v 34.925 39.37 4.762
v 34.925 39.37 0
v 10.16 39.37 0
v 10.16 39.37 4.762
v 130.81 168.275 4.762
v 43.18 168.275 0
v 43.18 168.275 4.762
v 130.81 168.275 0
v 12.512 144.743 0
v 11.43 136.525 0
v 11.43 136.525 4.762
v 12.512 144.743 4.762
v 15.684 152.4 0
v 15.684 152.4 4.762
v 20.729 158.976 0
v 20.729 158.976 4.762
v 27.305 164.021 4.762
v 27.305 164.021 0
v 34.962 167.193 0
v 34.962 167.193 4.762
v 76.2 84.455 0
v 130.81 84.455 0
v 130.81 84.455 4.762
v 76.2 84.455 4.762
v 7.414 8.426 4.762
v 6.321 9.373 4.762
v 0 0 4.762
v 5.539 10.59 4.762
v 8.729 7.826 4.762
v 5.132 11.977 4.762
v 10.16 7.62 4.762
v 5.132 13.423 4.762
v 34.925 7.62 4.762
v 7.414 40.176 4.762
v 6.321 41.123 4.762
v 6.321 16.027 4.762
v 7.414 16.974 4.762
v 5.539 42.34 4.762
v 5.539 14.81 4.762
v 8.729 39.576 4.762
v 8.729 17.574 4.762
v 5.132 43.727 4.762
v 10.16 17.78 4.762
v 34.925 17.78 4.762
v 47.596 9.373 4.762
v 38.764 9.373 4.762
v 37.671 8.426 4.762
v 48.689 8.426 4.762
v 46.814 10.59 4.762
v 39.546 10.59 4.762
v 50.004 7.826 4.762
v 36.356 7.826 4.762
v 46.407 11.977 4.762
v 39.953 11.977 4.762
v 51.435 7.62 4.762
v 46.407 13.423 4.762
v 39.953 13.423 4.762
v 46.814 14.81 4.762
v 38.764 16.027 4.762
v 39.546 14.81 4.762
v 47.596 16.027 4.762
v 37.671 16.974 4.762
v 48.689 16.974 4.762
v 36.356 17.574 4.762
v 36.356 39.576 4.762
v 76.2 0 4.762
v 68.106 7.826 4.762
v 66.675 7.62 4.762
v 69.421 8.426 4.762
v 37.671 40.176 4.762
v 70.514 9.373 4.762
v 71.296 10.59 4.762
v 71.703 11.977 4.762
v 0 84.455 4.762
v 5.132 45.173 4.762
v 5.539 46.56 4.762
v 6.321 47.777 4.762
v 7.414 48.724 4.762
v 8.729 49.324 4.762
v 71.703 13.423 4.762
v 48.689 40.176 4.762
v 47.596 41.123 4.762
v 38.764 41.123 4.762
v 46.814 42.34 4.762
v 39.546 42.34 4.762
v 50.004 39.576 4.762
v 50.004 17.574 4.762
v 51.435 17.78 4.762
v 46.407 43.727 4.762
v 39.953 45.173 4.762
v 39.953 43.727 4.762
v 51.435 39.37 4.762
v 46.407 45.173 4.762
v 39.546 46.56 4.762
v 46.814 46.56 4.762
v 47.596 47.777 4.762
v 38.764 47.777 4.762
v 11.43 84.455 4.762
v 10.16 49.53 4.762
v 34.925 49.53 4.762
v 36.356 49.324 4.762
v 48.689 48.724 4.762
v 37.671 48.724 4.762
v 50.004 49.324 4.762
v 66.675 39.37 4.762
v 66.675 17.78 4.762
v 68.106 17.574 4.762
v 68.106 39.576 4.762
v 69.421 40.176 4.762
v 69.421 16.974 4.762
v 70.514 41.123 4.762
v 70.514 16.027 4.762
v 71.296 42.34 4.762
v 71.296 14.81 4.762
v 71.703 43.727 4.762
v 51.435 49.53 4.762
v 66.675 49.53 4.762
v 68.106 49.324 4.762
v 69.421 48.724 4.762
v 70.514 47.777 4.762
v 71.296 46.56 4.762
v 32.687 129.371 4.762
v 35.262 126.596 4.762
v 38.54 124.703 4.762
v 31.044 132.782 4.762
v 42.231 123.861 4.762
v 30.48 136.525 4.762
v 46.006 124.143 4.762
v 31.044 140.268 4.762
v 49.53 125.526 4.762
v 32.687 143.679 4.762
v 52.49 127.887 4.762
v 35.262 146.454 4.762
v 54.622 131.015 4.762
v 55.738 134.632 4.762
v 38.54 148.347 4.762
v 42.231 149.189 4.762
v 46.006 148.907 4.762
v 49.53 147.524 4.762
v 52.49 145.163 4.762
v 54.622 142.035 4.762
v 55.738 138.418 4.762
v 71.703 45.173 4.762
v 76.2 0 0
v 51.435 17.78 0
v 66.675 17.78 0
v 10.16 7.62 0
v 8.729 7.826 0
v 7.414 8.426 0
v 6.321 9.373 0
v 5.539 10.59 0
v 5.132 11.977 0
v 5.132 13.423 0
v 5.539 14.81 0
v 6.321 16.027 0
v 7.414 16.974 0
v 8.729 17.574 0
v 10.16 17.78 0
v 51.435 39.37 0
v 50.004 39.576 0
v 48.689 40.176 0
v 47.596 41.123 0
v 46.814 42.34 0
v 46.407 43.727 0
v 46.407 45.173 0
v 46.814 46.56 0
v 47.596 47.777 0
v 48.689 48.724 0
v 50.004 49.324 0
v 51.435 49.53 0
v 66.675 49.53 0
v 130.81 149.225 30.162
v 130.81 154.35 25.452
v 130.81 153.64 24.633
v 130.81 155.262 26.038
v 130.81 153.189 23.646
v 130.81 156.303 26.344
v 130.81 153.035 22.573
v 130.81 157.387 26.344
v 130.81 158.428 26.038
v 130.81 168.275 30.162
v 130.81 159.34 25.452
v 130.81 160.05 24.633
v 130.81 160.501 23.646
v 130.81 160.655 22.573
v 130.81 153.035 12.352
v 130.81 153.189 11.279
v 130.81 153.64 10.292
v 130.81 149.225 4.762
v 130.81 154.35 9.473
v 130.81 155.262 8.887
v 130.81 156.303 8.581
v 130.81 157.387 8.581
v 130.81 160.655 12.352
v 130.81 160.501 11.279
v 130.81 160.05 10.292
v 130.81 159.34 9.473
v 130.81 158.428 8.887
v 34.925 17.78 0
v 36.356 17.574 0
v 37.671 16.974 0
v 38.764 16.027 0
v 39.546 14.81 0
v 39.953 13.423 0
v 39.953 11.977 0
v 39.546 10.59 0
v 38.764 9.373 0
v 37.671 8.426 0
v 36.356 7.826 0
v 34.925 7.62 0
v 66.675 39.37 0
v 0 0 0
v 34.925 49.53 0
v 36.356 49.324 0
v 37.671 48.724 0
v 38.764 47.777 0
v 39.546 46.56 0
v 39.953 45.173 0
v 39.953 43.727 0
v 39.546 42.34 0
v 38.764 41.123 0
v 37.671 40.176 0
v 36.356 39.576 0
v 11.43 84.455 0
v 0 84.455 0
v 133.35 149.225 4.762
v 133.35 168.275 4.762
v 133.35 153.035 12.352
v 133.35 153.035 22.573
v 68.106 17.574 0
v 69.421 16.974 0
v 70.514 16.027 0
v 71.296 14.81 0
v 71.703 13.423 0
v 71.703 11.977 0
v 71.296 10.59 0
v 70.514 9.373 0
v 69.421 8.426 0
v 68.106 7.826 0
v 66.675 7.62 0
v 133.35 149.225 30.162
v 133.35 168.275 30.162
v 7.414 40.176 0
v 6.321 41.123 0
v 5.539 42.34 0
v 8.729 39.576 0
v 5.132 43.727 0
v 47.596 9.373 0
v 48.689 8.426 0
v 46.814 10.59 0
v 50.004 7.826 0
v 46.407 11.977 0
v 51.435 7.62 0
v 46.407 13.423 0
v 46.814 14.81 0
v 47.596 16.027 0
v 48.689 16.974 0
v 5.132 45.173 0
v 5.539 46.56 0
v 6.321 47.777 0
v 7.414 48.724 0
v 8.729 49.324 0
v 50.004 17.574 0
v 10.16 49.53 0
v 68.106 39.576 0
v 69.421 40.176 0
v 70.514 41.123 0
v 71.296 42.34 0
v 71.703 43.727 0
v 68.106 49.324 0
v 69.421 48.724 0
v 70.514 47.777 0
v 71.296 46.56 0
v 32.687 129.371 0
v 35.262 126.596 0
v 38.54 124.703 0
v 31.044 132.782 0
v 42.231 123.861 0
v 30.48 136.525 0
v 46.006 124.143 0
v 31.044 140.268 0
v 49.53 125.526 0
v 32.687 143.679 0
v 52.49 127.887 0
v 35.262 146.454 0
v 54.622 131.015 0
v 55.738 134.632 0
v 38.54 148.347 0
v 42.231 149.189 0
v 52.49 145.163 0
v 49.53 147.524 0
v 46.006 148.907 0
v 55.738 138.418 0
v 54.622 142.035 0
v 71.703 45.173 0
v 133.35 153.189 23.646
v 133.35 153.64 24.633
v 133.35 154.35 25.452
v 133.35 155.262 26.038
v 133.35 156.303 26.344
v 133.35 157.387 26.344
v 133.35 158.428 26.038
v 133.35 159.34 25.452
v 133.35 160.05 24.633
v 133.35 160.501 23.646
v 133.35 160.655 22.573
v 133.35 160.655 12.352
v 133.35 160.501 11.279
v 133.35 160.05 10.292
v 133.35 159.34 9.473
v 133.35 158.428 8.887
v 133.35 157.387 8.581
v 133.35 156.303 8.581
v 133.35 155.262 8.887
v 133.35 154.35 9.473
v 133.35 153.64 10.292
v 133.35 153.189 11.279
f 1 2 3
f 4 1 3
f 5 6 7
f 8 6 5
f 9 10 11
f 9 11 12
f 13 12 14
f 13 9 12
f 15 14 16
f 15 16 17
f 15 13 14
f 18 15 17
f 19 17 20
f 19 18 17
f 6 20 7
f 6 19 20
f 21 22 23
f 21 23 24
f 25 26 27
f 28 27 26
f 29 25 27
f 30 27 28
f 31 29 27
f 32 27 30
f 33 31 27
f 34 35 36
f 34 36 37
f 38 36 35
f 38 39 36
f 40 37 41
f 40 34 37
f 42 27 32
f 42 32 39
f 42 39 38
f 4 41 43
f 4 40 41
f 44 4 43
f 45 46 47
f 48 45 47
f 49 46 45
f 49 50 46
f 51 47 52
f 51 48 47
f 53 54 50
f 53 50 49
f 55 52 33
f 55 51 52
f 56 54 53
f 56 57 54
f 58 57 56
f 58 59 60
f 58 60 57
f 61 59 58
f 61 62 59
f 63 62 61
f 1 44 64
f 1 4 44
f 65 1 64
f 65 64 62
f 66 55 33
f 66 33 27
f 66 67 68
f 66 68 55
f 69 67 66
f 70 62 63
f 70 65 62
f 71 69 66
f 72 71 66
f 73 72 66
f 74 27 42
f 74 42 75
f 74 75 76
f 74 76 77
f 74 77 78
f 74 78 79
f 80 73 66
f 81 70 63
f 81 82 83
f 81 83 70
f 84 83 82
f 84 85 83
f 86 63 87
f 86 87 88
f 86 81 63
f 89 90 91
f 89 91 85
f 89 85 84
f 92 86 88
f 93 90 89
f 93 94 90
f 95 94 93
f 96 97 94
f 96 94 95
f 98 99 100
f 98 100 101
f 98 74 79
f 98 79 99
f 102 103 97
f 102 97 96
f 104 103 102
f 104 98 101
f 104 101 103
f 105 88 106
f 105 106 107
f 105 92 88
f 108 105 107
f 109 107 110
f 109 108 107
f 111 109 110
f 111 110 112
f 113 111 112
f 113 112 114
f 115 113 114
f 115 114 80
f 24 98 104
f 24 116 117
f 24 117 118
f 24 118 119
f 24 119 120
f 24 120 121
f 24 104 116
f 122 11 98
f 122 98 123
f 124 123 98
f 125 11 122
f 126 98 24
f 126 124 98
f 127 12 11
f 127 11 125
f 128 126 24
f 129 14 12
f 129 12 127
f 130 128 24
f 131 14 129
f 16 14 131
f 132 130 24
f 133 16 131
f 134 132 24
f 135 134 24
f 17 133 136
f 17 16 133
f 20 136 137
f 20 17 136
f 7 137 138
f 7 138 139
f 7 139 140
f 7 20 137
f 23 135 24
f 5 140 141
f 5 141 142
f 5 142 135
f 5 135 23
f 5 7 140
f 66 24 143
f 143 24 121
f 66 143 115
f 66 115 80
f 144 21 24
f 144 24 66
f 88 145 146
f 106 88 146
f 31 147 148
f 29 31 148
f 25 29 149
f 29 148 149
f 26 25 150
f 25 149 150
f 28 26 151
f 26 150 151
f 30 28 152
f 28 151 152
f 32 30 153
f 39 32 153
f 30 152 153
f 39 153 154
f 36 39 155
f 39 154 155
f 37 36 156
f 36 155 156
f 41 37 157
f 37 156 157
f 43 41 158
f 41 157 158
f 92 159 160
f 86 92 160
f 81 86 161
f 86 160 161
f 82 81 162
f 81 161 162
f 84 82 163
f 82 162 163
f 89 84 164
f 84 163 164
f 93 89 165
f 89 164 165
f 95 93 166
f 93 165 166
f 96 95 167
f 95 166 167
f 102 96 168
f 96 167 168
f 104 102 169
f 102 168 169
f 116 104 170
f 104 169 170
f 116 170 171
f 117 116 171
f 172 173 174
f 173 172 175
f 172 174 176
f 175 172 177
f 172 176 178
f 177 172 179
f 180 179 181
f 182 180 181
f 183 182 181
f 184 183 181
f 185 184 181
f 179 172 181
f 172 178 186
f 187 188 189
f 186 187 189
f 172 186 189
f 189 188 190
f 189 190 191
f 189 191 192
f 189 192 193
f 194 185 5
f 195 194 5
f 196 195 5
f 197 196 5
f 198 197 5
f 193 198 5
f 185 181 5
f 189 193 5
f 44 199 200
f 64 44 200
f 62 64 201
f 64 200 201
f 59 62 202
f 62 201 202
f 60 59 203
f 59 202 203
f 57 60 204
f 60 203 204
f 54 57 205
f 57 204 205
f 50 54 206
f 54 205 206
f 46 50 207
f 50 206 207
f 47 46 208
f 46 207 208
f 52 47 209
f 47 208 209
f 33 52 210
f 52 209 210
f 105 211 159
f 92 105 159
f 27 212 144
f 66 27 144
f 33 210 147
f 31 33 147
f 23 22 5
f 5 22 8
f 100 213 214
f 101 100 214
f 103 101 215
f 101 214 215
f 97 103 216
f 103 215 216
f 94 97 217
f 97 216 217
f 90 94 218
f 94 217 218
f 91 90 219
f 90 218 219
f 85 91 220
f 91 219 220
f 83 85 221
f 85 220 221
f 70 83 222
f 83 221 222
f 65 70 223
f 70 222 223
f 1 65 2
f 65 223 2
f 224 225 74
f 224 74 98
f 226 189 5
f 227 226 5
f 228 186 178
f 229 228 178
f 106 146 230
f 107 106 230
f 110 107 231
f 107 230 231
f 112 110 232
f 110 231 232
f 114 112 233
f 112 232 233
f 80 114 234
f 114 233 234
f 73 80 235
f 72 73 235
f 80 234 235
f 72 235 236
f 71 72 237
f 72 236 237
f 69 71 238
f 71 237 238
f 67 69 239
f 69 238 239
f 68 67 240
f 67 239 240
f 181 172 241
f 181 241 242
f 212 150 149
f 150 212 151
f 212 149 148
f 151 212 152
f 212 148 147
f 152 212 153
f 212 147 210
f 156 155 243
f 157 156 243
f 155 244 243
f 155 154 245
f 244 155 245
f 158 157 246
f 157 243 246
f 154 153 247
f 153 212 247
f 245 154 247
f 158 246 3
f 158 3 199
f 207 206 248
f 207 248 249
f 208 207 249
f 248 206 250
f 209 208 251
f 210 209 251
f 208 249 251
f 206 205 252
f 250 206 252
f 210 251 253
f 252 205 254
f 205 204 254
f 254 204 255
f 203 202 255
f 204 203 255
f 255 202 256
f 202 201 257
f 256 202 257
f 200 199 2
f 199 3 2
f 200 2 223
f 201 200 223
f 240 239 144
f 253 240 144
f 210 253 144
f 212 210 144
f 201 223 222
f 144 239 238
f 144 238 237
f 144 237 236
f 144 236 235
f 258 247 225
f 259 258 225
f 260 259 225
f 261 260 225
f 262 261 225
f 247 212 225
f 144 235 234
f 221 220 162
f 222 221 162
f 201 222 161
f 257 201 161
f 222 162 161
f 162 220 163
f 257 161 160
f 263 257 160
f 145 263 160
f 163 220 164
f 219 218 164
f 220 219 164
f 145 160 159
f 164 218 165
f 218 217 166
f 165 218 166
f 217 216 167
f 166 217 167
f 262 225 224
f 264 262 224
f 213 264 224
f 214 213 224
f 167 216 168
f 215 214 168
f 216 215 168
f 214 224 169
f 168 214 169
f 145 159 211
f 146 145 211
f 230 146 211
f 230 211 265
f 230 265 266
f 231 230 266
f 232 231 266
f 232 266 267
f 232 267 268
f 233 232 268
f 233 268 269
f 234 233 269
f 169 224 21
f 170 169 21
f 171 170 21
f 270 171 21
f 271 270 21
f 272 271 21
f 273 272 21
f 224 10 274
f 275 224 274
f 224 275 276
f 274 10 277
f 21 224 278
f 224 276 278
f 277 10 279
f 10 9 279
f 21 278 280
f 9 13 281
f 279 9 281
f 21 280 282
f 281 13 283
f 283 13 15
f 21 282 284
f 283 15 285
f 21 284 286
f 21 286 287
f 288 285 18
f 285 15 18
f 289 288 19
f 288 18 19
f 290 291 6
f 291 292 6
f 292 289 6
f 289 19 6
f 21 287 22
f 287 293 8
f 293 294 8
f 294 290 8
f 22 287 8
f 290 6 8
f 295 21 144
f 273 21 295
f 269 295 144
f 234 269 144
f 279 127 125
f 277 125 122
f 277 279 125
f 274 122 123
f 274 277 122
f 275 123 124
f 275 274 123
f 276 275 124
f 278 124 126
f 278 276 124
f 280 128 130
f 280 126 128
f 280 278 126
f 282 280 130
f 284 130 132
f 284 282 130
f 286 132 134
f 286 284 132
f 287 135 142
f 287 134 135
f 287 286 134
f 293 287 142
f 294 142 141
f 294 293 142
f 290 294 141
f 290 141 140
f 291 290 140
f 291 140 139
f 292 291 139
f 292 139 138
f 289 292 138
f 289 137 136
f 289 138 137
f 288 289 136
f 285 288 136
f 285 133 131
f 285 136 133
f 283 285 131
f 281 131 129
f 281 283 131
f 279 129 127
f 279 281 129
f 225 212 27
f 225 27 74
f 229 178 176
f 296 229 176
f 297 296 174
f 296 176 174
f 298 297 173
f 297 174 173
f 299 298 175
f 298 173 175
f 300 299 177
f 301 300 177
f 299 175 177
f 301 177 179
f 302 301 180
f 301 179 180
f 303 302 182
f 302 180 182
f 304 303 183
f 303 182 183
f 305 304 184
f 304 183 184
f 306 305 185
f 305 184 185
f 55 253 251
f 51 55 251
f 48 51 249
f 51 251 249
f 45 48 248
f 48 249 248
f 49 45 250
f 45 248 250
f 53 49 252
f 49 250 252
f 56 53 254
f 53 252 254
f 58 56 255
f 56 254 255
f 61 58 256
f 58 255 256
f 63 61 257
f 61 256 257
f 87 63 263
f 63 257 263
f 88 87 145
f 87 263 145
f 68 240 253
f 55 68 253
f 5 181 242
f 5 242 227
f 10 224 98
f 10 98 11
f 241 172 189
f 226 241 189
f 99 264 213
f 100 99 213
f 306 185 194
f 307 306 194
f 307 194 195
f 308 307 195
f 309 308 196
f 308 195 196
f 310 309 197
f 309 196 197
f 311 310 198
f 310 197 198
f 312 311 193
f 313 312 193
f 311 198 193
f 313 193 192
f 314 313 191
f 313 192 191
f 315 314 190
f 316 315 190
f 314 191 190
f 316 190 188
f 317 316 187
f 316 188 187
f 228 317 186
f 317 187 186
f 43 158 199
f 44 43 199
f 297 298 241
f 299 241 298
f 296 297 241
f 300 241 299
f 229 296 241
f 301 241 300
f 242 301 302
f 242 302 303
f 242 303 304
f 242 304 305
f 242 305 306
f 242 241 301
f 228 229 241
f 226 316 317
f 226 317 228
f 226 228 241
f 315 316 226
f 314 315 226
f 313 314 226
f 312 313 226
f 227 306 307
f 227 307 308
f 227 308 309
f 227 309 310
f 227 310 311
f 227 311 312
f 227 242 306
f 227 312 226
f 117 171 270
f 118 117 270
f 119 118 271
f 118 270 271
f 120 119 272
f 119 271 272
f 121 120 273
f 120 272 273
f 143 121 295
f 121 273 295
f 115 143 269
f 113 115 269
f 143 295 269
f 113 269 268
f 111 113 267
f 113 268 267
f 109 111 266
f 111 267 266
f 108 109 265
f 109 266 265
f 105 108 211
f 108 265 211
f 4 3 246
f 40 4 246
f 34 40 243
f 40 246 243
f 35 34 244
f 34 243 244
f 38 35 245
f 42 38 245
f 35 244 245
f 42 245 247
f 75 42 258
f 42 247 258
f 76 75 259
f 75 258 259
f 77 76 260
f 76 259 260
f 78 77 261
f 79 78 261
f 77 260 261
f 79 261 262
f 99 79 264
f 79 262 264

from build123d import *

# Parameters (mm, degrees)
SKETCH1_W           = 130.81
SKETCH1_H           = 168.275
BOSS_EXTRUDE1_DEPTH = 4.7625
SKETCH2_OUTSIDE_W   = 175.448
SKETCH2_OUTSIDE_H   = 212.913
SKETCH2_OUTSIDE_R   = 12.7
CUT_EXTRUDE1_DEPTH  = 214.191024978
SKETCH3_W           = 25.4
SKETCH3_H           = 19.05
BOSS_EXTRUDE2_DEPTH = 2.54


with BuildPart() as part:
    # Sketch1 → Boss-Extrude1 (new body)
    with BuildSketch(Plane.XY):
        with Locations((65.405, 84.1375)):
            Rectangle(SKETCH1_W, SKETCH1_H)
    extrude(amount=BOSS_EXTRUDE1_DEPTH)

    # Sketch2 outside → Cut-Extrude1 (cut, through all)
    # profile 1 of 6: a face of its own
    with BuildSketch(Plane.XY):
        with Locations((65.405, 84.1375)):
            Rectangle(SKETCH2_OUTSIDE_W, SKETCH2_OUTSIDE_H)
        with BuildLine():
            Line((0, 84.455), (11.43, 84.455))
            Line((11.43, 84.455), (11.43, 136.525))
            ThreePointArc((11.43, 136.525), (20.729359697, 158.975640303), (43.18, 168.275))
            Line((43.18, 168.275), (130.81, 168.275))
            Line((130.81, 168.275), (130.81, 84.455))
            Line((130.81, 84.455), (76.2, 84.455))
            Line((76.2, 84.455), (76.2, 0))
            Line((76.2, 0), (0, 0))
            Line((0, 0), (0, 84.455))
        make_face(mode=Mode.SUBTRACT)
    # profile 2 of 6: a face of its own
    with BuildSketch(Plane.XY):
        with Locations(Location((43.18, 136.525, 0), (0, 0, 180))):
            Circle(SKETCH2_OUTSIDE_R)
    # profile 3 of 6: a face of its own
    with BuildSketch(Plane.XY):
        with BuildLine():
            Line((10.16, 49.53), (34.925, 49.53))
            ThreePointArc((34.925, 49.53), (40.005, 44.45), (34.925, 39.37))
            Line((34.925, 39.37), (10.16, 39.37))
            ThreePointArc((10.16, 39.37), (5.08, 44.45), (10.16, 49.53))
        make_face()
    # profile 4 of 6: a face of its own
    with BuildSketch(Plane.XY):
        with BuildLine():
            Line((10.16, 17.78), (34.925, 17.78))
            ThreePointArc((34.925, 17.78), (40.005, 12.7), (34.925, 7.62))
            Line((34.925, 7.62), (10.16, 7.62))
            ThreePointArc((10.16, 7.62), (5.08, 12.7), (10.16, 17.78))
        make_face()
    # profile 5 of 6: a face of its own
    with BuildSketch(Plane.XY):
        with BuildLine():
            Line((51.435, 49.53), (66.675, 49.53))
            ThreePointArc((66.675, 49.53), (71.755, 44.45), (66.675, 39.37))
            Line((66.675, 39.37), (51.435, 39.37))
            ThreePointArc((51.435, 39.37), (46.355, 44.45), (51.435, 49.53))
        make_face()
    # profile 6 of 6: a face of its own
    with BuildSketch(Plane.XY):
        with BuildLine():
            Line((51.435, 17.78), (66.675, 17.78))
            ThreePointArc((66.675, 17.78), (71.755, 12.7), (66.675, 7.62))
            Line((66.675, 7.62), (51.435, 7.62))
            ThreePointArc((51.435, 7.62), (46.355, 12.7), (51.435, 17.78))
        make_face()
    extrude(amount=CUT_EXTRUDE1_DEPTH, mode=Mode.SUBTRACT)


with BuildPart() as body_2:
    # Sketch3 → Boss-Extrude2 (new body)
    with BuildSketch(Plane(origin=(130.81, 0, 0), x_dir=(0, 0, -1), z_dir=(1, 0, 0))):
        with Locations((-17.4625, 158.75)):
            Rectangle(SKETCH3_W, SKETCH3_H)
        with BuildLine():
            Line((-22.572792052, 160.655), (-12.352207948, 160.655))
            ThreePointArc((-12.352207948, 160.655), (-8.542207948, 156.845), (-12.352207948, 153.035))
            Line((-12.352207948, 153.035), (-22.572792052, 153.035))
            ThreePointArc((-22.572792052, 153.035), (-26.382792052, 156.845), (-22.572792052, 160.655))
        make_face(mode=Mode.SUBTRACT)
    extrude(amount=BOSS_EXTRUDE2_DEPTH)


solid = Compound([part.part, body_2.part])
